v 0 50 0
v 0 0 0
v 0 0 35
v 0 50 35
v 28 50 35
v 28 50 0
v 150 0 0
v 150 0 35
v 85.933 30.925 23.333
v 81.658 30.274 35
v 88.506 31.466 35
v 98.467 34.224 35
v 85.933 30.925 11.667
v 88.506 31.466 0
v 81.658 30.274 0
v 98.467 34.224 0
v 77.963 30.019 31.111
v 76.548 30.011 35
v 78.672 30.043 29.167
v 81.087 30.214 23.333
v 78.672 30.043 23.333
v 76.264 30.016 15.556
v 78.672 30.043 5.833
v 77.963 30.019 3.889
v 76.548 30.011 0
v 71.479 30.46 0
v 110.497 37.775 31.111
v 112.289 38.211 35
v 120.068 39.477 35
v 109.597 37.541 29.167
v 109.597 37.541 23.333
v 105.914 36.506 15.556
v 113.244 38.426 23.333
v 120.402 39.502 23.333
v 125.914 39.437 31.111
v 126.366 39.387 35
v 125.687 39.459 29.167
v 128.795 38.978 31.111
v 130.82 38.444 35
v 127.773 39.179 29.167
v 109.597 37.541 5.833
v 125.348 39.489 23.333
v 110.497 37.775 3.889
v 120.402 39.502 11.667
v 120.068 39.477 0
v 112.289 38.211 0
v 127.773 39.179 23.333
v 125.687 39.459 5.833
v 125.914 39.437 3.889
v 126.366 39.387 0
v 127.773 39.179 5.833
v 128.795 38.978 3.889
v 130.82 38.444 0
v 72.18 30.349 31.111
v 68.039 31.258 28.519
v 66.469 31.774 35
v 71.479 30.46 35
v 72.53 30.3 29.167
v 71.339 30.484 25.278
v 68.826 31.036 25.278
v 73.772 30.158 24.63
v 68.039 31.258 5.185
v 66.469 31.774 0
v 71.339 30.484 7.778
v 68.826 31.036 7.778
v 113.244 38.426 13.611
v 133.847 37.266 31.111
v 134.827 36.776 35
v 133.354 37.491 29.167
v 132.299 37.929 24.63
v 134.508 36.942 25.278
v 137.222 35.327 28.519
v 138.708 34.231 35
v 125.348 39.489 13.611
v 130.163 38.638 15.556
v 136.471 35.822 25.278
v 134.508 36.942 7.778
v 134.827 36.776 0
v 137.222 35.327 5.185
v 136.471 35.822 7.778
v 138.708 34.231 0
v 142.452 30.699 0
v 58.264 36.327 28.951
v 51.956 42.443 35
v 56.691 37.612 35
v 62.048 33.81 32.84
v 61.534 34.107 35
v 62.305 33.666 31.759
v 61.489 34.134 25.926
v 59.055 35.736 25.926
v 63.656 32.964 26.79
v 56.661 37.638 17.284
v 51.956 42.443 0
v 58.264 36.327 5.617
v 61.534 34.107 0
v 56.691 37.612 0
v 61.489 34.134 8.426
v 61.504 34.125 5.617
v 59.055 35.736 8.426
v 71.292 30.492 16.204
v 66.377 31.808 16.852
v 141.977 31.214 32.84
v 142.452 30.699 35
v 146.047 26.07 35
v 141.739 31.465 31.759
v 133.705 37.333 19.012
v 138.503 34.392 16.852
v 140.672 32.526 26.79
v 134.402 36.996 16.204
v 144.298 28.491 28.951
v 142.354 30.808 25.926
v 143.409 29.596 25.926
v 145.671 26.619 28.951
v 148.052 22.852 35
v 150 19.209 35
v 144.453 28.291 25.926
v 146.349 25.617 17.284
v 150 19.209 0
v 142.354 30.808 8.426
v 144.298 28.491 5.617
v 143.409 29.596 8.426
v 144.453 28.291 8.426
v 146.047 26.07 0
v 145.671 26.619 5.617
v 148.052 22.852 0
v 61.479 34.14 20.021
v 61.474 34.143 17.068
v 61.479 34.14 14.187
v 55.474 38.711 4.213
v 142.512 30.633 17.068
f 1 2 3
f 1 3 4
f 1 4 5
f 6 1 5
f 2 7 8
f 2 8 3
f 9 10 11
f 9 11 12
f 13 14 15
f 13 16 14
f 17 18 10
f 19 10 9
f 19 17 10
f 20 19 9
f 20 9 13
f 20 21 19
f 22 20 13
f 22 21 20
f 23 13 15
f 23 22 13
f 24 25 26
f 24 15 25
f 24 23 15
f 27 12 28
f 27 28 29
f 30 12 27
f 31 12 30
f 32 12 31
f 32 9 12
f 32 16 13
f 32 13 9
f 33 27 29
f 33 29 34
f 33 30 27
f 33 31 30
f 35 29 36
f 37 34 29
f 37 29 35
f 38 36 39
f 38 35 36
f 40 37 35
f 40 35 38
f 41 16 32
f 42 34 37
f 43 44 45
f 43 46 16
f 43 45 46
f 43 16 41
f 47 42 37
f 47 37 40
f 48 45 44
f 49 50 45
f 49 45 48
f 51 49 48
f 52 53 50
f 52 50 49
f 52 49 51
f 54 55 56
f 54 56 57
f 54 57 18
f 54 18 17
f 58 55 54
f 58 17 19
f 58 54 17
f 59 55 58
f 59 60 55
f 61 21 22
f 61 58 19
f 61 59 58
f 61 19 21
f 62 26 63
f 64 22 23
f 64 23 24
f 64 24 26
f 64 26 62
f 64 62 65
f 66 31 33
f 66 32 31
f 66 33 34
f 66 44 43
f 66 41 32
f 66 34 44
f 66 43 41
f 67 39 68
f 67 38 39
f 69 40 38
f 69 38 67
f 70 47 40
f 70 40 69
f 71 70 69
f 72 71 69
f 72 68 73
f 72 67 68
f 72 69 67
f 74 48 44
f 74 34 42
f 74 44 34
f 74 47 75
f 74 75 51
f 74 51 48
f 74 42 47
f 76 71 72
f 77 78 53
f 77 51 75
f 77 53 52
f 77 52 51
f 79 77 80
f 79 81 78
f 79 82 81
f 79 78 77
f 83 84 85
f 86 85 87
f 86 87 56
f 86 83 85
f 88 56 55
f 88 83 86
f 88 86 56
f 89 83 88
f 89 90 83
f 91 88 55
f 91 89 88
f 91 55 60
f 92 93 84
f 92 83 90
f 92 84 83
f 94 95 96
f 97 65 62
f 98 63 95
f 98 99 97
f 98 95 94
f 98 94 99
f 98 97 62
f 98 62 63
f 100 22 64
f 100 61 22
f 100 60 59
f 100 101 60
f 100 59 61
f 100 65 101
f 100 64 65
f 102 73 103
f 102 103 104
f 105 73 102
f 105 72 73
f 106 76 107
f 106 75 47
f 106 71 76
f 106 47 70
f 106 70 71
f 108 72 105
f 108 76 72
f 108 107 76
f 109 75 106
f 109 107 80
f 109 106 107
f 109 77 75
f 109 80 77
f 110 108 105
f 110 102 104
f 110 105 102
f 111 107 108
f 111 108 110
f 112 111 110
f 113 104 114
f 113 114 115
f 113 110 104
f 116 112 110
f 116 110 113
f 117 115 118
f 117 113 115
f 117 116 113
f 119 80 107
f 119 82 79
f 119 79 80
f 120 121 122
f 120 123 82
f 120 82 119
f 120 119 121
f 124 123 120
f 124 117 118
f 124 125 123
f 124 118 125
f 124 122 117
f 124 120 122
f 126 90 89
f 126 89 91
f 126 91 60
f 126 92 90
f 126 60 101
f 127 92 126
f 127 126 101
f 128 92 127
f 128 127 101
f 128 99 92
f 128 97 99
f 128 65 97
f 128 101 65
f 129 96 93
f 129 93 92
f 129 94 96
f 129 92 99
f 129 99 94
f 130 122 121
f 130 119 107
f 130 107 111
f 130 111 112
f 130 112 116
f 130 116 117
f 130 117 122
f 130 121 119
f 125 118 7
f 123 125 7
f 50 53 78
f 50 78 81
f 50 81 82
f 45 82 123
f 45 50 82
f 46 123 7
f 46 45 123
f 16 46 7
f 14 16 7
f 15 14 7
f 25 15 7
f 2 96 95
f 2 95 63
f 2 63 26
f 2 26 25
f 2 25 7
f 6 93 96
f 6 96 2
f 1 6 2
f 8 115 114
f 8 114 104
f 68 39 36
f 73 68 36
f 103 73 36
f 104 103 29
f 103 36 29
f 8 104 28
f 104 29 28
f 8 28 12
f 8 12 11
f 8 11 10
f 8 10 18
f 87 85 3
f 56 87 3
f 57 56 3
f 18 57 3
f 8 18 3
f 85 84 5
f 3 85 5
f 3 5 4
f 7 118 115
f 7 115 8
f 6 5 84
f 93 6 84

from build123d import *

# Parameters (mm, degrees)
EXTRUDE_1_DEPTH = 35


with BuildPart() as part:
    # 草圖2 → 填料-伸長1 (new body)
    with BuildSketch(Plane.XY):
        with BuildLine():
            Line((0, 0), (0, 50))
            Line((0, 50), (28, 50))
            Line((28, 50), (51.956313103, 42.44328469))
            add(Edge.make_bspline(
                [(51.956313103, 42.44328469), (83.897076516, 4.556034867), (124.627264654, 70.257246507), (150, 19.209377101)],
                knots=[0, 0, 0, 0, 1, 1, 1, 1], degree=3))
            Line((150, 19.209377101), (150, 0))
            Line((150, 0), (0, 0))
        make_face()
    extrude(amount=EXTRUDE_1_DEPTH)


solid = part.part
